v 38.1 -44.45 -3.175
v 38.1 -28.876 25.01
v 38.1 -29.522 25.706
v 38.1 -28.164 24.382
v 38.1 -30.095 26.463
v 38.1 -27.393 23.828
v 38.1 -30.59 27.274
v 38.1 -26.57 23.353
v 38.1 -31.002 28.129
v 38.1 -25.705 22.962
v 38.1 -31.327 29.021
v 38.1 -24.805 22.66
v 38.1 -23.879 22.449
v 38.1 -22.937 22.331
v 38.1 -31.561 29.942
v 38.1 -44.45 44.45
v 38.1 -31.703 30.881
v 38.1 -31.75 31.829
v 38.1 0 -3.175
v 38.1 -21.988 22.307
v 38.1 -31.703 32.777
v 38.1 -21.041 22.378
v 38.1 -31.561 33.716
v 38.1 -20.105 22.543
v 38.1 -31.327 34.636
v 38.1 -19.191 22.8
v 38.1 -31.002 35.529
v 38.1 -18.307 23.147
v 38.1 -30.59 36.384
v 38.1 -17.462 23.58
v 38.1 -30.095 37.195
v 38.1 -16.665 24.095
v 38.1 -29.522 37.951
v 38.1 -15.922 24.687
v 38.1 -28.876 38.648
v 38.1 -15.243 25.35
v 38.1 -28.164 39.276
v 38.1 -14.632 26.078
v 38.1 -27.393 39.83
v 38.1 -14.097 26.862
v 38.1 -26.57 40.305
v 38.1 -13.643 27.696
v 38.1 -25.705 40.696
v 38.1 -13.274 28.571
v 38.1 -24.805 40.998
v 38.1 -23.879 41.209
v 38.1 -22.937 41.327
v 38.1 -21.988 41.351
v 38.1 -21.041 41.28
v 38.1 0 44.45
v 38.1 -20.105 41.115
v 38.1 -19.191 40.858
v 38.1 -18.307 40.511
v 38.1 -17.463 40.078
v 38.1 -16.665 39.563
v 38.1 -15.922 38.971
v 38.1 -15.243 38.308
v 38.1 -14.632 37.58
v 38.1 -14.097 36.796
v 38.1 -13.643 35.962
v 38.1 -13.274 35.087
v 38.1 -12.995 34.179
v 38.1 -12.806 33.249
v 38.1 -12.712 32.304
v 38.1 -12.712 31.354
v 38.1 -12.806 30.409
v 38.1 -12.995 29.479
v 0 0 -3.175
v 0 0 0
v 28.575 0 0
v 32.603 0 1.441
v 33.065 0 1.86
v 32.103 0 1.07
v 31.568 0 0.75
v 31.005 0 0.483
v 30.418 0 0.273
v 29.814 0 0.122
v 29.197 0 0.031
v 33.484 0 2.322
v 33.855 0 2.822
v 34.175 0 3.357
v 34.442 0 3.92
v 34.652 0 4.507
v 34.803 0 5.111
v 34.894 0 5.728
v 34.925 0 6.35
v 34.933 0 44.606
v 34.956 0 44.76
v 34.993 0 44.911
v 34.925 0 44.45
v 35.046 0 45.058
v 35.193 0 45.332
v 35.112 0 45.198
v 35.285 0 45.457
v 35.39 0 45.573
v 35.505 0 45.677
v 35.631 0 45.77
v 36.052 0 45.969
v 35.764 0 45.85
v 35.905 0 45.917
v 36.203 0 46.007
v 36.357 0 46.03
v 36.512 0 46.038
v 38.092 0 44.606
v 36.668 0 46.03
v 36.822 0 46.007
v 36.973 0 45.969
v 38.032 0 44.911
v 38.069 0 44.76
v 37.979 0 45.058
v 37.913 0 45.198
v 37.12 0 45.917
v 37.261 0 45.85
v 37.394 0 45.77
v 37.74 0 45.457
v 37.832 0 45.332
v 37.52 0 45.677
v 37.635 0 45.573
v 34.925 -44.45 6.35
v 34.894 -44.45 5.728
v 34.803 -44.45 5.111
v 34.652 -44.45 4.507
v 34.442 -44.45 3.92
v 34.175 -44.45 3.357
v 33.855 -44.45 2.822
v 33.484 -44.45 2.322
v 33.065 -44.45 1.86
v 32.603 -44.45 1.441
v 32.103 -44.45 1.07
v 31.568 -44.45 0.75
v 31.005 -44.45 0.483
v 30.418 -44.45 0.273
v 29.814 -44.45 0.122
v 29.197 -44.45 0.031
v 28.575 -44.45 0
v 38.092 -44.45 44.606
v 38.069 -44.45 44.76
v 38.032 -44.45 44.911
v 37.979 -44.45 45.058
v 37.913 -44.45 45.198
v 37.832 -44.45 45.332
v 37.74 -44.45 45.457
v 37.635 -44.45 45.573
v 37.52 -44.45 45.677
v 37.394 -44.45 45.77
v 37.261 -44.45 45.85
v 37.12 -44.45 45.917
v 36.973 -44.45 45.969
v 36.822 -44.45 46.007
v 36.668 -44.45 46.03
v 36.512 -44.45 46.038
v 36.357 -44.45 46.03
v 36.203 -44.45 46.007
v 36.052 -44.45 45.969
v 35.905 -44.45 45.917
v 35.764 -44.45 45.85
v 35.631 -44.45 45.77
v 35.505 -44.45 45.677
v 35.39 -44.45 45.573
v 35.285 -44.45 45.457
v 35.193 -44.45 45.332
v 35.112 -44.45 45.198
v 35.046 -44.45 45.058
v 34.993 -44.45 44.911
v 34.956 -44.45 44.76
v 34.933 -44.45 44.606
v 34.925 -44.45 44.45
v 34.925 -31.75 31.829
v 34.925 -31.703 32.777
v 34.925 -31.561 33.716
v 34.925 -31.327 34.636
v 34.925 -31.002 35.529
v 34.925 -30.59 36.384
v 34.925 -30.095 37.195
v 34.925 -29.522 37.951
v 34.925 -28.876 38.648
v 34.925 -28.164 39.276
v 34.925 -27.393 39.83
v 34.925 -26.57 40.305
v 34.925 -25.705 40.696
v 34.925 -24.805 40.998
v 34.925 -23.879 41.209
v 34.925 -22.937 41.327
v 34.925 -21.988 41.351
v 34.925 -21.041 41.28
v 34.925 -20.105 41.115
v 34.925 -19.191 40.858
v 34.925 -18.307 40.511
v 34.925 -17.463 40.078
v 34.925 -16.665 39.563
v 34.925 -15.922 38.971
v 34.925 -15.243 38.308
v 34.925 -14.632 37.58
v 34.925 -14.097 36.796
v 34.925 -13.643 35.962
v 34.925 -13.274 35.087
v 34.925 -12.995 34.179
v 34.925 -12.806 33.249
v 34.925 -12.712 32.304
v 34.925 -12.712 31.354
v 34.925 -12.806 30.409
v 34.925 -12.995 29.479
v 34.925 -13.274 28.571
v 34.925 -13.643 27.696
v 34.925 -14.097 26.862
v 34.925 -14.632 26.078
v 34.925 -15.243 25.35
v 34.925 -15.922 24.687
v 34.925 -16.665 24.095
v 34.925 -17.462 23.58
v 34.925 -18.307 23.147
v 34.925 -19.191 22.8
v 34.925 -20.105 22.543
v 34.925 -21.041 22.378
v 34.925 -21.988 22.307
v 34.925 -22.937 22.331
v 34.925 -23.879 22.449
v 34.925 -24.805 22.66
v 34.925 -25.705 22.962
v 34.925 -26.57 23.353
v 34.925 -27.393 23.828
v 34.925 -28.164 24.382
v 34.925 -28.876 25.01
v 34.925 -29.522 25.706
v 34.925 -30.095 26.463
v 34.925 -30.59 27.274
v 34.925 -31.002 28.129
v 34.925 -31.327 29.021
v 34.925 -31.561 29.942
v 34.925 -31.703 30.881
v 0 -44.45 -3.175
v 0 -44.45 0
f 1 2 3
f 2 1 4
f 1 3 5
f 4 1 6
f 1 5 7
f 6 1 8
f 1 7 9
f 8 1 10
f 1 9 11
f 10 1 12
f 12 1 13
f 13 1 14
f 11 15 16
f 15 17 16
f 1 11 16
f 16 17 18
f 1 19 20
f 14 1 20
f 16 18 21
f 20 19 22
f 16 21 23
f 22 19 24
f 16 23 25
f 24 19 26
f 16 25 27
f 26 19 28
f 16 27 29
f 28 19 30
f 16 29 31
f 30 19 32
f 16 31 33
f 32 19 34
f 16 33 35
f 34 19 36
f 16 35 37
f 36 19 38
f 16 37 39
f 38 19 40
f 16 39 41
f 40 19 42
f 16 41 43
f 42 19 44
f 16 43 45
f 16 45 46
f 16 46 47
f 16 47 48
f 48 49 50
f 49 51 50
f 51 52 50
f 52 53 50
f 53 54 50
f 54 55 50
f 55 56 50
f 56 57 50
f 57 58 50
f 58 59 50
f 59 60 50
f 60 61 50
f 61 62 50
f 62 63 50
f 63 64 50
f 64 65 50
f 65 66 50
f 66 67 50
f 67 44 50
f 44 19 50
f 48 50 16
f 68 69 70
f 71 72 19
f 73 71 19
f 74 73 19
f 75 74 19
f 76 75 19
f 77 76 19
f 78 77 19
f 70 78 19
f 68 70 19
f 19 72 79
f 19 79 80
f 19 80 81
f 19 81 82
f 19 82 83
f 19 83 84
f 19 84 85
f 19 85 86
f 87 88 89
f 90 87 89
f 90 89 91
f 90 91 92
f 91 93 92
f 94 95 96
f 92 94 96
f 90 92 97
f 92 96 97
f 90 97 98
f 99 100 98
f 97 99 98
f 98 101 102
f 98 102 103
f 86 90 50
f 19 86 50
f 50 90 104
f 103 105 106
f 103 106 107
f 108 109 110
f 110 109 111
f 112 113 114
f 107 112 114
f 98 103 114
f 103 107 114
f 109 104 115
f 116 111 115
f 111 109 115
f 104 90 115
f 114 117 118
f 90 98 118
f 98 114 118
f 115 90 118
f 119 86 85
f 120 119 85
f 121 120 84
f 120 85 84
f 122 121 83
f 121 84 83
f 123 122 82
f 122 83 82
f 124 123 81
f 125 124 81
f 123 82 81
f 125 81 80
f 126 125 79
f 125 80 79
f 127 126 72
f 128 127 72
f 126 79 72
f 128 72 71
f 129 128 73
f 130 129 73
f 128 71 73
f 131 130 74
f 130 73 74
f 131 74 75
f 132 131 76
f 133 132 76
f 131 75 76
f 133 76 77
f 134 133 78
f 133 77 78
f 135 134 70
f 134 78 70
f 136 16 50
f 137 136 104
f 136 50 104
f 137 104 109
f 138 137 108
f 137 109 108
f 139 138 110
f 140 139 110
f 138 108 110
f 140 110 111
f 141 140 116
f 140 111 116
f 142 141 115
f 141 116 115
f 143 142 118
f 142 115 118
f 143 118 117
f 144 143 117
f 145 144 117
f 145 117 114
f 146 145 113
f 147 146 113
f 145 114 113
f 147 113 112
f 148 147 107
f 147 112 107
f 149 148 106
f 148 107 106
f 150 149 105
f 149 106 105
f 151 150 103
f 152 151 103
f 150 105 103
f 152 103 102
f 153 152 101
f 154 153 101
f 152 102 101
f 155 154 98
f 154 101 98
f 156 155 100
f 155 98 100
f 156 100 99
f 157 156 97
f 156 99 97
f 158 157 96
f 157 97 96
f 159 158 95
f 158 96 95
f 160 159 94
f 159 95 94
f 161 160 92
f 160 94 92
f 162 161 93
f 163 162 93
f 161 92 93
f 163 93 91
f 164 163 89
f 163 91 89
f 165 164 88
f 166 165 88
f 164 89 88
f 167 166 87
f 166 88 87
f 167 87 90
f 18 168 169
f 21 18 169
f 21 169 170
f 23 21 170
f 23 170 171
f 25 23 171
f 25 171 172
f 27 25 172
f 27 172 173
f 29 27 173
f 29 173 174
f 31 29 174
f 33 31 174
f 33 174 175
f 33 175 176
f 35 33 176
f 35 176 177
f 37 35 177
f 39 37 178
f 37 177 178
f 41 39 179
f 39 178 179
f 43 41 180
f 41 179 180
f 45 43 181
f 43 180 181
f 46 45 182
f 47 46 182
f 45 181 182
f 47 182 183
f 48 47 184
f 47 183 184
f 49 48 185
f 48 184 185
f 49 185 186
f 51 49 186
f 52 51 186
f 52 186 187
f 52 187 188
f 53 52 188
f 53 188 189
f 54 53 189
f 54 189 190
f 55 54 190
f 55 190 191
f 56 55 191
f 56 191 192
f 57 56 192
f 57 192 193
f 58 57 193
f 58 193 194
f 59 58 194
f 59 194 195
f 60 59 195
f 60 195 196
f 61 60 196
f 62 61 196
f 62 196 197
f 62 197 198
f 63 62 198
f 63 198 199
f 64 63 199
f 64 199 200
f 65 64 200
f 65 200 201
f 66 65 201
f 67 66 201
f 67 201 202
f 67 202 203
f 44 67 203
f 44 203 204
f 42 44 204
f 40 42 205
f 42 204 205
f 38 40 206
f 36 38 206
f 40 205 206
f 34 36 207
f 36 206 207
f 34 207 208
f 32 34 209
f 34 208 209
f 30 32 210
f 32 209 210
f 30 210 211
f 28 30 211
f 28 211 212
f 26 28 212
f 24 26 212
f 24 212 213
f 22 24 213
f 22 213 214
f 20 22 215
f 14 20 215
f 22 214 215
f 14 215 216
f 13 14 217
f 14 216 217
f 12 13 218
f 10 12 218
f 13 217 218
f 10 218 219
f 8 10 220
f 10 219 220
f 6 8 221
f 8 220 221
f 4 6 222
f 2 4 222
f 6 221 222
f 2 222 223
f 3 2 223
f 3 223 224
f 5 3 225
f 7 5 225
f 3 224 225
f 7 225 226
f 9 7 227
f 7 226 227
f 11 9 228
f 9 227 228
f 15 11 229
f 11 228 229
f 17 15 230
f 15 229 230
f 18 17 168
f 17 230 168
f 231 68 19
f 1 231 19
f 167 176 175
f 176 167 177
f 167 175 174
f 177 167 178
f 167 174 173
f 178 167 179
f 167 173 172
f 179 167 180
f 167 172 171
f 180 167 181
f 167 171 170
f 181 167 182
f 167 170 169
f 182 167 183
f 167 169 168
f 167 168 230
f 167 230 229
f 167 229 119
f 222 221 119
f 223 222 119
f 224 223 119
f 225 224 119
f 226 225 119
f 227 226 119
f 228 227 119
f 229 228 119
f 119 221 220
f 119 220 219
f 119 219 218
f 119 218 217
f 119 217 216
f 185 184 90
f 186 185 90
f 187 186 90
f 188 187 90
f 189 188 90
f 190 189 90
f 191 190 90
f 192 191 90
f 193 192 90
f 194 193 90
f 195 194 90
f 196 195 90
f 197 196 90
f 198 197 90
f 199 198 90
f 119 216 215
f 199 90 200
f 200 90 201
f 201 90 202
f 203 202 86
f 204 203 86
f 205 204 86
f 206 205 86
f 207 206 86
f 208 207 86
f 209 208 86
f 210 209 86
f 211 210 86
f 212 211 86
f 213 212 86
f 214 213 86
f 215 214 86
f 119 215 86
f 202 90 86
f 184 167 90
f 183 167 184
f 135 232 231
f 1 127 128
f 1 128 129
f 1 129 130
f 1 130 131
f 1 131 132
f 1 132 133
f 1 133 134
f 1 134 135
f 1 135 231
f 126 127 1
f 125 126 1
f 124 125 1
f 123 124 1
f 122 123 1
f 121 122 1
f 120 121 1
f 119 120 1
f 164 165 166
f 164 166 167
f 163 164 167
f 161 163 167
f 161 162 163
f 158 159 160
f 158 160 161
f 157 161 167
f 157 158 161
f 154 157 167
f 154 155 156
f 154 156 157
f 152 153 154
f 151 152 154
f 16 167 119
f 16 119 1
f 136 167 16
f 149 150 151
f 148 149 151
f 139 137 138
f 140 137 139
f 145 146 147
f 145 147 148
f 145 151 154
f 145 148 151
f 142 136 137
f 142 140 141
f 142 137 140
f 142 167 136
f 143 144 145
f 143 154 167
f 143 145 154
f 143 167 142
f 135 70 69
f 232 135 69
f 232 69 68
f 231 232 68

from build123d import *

# Parameters (mm, degrees)
F1_DEPTH = 44.45
F3_D     = 19.05
F3_DEPTH = 25.4


with BuildPart() as f1:
    # F0 (on Front) → F1 (new body)
    with BuildSketch(Plane.XZ):
        with BuildLine():
            Line((28.575, 0), (0, 0))
            Line((0, 0), (0, -3.175))
            Line((0, -3.175), (34.925, -3.175))
            Line((34.925, -3.175), (38.1, -3.175))
            Line((38.1, -3.175), (38.1, 44.45))
            ThreePointArc((38.1, 44.45), (36.5125, 46.0375), (34.925, 44.45))
            Line((34.925, 44.45), (34.925, 6.35))
            ThreePointArc((34.925, 6.35), (33.065128, 1.859872), (28.575, 0))
        make_face()
    extrude(amount=F1_DEPTH)

    # F3
    with Locations(Plane.YZ.offset(38.1)):
        with Locations((-22.225, 31.828932)):
            Hole(F3_D / 2, depth=F3_DEPTH)


solid = f1.part
